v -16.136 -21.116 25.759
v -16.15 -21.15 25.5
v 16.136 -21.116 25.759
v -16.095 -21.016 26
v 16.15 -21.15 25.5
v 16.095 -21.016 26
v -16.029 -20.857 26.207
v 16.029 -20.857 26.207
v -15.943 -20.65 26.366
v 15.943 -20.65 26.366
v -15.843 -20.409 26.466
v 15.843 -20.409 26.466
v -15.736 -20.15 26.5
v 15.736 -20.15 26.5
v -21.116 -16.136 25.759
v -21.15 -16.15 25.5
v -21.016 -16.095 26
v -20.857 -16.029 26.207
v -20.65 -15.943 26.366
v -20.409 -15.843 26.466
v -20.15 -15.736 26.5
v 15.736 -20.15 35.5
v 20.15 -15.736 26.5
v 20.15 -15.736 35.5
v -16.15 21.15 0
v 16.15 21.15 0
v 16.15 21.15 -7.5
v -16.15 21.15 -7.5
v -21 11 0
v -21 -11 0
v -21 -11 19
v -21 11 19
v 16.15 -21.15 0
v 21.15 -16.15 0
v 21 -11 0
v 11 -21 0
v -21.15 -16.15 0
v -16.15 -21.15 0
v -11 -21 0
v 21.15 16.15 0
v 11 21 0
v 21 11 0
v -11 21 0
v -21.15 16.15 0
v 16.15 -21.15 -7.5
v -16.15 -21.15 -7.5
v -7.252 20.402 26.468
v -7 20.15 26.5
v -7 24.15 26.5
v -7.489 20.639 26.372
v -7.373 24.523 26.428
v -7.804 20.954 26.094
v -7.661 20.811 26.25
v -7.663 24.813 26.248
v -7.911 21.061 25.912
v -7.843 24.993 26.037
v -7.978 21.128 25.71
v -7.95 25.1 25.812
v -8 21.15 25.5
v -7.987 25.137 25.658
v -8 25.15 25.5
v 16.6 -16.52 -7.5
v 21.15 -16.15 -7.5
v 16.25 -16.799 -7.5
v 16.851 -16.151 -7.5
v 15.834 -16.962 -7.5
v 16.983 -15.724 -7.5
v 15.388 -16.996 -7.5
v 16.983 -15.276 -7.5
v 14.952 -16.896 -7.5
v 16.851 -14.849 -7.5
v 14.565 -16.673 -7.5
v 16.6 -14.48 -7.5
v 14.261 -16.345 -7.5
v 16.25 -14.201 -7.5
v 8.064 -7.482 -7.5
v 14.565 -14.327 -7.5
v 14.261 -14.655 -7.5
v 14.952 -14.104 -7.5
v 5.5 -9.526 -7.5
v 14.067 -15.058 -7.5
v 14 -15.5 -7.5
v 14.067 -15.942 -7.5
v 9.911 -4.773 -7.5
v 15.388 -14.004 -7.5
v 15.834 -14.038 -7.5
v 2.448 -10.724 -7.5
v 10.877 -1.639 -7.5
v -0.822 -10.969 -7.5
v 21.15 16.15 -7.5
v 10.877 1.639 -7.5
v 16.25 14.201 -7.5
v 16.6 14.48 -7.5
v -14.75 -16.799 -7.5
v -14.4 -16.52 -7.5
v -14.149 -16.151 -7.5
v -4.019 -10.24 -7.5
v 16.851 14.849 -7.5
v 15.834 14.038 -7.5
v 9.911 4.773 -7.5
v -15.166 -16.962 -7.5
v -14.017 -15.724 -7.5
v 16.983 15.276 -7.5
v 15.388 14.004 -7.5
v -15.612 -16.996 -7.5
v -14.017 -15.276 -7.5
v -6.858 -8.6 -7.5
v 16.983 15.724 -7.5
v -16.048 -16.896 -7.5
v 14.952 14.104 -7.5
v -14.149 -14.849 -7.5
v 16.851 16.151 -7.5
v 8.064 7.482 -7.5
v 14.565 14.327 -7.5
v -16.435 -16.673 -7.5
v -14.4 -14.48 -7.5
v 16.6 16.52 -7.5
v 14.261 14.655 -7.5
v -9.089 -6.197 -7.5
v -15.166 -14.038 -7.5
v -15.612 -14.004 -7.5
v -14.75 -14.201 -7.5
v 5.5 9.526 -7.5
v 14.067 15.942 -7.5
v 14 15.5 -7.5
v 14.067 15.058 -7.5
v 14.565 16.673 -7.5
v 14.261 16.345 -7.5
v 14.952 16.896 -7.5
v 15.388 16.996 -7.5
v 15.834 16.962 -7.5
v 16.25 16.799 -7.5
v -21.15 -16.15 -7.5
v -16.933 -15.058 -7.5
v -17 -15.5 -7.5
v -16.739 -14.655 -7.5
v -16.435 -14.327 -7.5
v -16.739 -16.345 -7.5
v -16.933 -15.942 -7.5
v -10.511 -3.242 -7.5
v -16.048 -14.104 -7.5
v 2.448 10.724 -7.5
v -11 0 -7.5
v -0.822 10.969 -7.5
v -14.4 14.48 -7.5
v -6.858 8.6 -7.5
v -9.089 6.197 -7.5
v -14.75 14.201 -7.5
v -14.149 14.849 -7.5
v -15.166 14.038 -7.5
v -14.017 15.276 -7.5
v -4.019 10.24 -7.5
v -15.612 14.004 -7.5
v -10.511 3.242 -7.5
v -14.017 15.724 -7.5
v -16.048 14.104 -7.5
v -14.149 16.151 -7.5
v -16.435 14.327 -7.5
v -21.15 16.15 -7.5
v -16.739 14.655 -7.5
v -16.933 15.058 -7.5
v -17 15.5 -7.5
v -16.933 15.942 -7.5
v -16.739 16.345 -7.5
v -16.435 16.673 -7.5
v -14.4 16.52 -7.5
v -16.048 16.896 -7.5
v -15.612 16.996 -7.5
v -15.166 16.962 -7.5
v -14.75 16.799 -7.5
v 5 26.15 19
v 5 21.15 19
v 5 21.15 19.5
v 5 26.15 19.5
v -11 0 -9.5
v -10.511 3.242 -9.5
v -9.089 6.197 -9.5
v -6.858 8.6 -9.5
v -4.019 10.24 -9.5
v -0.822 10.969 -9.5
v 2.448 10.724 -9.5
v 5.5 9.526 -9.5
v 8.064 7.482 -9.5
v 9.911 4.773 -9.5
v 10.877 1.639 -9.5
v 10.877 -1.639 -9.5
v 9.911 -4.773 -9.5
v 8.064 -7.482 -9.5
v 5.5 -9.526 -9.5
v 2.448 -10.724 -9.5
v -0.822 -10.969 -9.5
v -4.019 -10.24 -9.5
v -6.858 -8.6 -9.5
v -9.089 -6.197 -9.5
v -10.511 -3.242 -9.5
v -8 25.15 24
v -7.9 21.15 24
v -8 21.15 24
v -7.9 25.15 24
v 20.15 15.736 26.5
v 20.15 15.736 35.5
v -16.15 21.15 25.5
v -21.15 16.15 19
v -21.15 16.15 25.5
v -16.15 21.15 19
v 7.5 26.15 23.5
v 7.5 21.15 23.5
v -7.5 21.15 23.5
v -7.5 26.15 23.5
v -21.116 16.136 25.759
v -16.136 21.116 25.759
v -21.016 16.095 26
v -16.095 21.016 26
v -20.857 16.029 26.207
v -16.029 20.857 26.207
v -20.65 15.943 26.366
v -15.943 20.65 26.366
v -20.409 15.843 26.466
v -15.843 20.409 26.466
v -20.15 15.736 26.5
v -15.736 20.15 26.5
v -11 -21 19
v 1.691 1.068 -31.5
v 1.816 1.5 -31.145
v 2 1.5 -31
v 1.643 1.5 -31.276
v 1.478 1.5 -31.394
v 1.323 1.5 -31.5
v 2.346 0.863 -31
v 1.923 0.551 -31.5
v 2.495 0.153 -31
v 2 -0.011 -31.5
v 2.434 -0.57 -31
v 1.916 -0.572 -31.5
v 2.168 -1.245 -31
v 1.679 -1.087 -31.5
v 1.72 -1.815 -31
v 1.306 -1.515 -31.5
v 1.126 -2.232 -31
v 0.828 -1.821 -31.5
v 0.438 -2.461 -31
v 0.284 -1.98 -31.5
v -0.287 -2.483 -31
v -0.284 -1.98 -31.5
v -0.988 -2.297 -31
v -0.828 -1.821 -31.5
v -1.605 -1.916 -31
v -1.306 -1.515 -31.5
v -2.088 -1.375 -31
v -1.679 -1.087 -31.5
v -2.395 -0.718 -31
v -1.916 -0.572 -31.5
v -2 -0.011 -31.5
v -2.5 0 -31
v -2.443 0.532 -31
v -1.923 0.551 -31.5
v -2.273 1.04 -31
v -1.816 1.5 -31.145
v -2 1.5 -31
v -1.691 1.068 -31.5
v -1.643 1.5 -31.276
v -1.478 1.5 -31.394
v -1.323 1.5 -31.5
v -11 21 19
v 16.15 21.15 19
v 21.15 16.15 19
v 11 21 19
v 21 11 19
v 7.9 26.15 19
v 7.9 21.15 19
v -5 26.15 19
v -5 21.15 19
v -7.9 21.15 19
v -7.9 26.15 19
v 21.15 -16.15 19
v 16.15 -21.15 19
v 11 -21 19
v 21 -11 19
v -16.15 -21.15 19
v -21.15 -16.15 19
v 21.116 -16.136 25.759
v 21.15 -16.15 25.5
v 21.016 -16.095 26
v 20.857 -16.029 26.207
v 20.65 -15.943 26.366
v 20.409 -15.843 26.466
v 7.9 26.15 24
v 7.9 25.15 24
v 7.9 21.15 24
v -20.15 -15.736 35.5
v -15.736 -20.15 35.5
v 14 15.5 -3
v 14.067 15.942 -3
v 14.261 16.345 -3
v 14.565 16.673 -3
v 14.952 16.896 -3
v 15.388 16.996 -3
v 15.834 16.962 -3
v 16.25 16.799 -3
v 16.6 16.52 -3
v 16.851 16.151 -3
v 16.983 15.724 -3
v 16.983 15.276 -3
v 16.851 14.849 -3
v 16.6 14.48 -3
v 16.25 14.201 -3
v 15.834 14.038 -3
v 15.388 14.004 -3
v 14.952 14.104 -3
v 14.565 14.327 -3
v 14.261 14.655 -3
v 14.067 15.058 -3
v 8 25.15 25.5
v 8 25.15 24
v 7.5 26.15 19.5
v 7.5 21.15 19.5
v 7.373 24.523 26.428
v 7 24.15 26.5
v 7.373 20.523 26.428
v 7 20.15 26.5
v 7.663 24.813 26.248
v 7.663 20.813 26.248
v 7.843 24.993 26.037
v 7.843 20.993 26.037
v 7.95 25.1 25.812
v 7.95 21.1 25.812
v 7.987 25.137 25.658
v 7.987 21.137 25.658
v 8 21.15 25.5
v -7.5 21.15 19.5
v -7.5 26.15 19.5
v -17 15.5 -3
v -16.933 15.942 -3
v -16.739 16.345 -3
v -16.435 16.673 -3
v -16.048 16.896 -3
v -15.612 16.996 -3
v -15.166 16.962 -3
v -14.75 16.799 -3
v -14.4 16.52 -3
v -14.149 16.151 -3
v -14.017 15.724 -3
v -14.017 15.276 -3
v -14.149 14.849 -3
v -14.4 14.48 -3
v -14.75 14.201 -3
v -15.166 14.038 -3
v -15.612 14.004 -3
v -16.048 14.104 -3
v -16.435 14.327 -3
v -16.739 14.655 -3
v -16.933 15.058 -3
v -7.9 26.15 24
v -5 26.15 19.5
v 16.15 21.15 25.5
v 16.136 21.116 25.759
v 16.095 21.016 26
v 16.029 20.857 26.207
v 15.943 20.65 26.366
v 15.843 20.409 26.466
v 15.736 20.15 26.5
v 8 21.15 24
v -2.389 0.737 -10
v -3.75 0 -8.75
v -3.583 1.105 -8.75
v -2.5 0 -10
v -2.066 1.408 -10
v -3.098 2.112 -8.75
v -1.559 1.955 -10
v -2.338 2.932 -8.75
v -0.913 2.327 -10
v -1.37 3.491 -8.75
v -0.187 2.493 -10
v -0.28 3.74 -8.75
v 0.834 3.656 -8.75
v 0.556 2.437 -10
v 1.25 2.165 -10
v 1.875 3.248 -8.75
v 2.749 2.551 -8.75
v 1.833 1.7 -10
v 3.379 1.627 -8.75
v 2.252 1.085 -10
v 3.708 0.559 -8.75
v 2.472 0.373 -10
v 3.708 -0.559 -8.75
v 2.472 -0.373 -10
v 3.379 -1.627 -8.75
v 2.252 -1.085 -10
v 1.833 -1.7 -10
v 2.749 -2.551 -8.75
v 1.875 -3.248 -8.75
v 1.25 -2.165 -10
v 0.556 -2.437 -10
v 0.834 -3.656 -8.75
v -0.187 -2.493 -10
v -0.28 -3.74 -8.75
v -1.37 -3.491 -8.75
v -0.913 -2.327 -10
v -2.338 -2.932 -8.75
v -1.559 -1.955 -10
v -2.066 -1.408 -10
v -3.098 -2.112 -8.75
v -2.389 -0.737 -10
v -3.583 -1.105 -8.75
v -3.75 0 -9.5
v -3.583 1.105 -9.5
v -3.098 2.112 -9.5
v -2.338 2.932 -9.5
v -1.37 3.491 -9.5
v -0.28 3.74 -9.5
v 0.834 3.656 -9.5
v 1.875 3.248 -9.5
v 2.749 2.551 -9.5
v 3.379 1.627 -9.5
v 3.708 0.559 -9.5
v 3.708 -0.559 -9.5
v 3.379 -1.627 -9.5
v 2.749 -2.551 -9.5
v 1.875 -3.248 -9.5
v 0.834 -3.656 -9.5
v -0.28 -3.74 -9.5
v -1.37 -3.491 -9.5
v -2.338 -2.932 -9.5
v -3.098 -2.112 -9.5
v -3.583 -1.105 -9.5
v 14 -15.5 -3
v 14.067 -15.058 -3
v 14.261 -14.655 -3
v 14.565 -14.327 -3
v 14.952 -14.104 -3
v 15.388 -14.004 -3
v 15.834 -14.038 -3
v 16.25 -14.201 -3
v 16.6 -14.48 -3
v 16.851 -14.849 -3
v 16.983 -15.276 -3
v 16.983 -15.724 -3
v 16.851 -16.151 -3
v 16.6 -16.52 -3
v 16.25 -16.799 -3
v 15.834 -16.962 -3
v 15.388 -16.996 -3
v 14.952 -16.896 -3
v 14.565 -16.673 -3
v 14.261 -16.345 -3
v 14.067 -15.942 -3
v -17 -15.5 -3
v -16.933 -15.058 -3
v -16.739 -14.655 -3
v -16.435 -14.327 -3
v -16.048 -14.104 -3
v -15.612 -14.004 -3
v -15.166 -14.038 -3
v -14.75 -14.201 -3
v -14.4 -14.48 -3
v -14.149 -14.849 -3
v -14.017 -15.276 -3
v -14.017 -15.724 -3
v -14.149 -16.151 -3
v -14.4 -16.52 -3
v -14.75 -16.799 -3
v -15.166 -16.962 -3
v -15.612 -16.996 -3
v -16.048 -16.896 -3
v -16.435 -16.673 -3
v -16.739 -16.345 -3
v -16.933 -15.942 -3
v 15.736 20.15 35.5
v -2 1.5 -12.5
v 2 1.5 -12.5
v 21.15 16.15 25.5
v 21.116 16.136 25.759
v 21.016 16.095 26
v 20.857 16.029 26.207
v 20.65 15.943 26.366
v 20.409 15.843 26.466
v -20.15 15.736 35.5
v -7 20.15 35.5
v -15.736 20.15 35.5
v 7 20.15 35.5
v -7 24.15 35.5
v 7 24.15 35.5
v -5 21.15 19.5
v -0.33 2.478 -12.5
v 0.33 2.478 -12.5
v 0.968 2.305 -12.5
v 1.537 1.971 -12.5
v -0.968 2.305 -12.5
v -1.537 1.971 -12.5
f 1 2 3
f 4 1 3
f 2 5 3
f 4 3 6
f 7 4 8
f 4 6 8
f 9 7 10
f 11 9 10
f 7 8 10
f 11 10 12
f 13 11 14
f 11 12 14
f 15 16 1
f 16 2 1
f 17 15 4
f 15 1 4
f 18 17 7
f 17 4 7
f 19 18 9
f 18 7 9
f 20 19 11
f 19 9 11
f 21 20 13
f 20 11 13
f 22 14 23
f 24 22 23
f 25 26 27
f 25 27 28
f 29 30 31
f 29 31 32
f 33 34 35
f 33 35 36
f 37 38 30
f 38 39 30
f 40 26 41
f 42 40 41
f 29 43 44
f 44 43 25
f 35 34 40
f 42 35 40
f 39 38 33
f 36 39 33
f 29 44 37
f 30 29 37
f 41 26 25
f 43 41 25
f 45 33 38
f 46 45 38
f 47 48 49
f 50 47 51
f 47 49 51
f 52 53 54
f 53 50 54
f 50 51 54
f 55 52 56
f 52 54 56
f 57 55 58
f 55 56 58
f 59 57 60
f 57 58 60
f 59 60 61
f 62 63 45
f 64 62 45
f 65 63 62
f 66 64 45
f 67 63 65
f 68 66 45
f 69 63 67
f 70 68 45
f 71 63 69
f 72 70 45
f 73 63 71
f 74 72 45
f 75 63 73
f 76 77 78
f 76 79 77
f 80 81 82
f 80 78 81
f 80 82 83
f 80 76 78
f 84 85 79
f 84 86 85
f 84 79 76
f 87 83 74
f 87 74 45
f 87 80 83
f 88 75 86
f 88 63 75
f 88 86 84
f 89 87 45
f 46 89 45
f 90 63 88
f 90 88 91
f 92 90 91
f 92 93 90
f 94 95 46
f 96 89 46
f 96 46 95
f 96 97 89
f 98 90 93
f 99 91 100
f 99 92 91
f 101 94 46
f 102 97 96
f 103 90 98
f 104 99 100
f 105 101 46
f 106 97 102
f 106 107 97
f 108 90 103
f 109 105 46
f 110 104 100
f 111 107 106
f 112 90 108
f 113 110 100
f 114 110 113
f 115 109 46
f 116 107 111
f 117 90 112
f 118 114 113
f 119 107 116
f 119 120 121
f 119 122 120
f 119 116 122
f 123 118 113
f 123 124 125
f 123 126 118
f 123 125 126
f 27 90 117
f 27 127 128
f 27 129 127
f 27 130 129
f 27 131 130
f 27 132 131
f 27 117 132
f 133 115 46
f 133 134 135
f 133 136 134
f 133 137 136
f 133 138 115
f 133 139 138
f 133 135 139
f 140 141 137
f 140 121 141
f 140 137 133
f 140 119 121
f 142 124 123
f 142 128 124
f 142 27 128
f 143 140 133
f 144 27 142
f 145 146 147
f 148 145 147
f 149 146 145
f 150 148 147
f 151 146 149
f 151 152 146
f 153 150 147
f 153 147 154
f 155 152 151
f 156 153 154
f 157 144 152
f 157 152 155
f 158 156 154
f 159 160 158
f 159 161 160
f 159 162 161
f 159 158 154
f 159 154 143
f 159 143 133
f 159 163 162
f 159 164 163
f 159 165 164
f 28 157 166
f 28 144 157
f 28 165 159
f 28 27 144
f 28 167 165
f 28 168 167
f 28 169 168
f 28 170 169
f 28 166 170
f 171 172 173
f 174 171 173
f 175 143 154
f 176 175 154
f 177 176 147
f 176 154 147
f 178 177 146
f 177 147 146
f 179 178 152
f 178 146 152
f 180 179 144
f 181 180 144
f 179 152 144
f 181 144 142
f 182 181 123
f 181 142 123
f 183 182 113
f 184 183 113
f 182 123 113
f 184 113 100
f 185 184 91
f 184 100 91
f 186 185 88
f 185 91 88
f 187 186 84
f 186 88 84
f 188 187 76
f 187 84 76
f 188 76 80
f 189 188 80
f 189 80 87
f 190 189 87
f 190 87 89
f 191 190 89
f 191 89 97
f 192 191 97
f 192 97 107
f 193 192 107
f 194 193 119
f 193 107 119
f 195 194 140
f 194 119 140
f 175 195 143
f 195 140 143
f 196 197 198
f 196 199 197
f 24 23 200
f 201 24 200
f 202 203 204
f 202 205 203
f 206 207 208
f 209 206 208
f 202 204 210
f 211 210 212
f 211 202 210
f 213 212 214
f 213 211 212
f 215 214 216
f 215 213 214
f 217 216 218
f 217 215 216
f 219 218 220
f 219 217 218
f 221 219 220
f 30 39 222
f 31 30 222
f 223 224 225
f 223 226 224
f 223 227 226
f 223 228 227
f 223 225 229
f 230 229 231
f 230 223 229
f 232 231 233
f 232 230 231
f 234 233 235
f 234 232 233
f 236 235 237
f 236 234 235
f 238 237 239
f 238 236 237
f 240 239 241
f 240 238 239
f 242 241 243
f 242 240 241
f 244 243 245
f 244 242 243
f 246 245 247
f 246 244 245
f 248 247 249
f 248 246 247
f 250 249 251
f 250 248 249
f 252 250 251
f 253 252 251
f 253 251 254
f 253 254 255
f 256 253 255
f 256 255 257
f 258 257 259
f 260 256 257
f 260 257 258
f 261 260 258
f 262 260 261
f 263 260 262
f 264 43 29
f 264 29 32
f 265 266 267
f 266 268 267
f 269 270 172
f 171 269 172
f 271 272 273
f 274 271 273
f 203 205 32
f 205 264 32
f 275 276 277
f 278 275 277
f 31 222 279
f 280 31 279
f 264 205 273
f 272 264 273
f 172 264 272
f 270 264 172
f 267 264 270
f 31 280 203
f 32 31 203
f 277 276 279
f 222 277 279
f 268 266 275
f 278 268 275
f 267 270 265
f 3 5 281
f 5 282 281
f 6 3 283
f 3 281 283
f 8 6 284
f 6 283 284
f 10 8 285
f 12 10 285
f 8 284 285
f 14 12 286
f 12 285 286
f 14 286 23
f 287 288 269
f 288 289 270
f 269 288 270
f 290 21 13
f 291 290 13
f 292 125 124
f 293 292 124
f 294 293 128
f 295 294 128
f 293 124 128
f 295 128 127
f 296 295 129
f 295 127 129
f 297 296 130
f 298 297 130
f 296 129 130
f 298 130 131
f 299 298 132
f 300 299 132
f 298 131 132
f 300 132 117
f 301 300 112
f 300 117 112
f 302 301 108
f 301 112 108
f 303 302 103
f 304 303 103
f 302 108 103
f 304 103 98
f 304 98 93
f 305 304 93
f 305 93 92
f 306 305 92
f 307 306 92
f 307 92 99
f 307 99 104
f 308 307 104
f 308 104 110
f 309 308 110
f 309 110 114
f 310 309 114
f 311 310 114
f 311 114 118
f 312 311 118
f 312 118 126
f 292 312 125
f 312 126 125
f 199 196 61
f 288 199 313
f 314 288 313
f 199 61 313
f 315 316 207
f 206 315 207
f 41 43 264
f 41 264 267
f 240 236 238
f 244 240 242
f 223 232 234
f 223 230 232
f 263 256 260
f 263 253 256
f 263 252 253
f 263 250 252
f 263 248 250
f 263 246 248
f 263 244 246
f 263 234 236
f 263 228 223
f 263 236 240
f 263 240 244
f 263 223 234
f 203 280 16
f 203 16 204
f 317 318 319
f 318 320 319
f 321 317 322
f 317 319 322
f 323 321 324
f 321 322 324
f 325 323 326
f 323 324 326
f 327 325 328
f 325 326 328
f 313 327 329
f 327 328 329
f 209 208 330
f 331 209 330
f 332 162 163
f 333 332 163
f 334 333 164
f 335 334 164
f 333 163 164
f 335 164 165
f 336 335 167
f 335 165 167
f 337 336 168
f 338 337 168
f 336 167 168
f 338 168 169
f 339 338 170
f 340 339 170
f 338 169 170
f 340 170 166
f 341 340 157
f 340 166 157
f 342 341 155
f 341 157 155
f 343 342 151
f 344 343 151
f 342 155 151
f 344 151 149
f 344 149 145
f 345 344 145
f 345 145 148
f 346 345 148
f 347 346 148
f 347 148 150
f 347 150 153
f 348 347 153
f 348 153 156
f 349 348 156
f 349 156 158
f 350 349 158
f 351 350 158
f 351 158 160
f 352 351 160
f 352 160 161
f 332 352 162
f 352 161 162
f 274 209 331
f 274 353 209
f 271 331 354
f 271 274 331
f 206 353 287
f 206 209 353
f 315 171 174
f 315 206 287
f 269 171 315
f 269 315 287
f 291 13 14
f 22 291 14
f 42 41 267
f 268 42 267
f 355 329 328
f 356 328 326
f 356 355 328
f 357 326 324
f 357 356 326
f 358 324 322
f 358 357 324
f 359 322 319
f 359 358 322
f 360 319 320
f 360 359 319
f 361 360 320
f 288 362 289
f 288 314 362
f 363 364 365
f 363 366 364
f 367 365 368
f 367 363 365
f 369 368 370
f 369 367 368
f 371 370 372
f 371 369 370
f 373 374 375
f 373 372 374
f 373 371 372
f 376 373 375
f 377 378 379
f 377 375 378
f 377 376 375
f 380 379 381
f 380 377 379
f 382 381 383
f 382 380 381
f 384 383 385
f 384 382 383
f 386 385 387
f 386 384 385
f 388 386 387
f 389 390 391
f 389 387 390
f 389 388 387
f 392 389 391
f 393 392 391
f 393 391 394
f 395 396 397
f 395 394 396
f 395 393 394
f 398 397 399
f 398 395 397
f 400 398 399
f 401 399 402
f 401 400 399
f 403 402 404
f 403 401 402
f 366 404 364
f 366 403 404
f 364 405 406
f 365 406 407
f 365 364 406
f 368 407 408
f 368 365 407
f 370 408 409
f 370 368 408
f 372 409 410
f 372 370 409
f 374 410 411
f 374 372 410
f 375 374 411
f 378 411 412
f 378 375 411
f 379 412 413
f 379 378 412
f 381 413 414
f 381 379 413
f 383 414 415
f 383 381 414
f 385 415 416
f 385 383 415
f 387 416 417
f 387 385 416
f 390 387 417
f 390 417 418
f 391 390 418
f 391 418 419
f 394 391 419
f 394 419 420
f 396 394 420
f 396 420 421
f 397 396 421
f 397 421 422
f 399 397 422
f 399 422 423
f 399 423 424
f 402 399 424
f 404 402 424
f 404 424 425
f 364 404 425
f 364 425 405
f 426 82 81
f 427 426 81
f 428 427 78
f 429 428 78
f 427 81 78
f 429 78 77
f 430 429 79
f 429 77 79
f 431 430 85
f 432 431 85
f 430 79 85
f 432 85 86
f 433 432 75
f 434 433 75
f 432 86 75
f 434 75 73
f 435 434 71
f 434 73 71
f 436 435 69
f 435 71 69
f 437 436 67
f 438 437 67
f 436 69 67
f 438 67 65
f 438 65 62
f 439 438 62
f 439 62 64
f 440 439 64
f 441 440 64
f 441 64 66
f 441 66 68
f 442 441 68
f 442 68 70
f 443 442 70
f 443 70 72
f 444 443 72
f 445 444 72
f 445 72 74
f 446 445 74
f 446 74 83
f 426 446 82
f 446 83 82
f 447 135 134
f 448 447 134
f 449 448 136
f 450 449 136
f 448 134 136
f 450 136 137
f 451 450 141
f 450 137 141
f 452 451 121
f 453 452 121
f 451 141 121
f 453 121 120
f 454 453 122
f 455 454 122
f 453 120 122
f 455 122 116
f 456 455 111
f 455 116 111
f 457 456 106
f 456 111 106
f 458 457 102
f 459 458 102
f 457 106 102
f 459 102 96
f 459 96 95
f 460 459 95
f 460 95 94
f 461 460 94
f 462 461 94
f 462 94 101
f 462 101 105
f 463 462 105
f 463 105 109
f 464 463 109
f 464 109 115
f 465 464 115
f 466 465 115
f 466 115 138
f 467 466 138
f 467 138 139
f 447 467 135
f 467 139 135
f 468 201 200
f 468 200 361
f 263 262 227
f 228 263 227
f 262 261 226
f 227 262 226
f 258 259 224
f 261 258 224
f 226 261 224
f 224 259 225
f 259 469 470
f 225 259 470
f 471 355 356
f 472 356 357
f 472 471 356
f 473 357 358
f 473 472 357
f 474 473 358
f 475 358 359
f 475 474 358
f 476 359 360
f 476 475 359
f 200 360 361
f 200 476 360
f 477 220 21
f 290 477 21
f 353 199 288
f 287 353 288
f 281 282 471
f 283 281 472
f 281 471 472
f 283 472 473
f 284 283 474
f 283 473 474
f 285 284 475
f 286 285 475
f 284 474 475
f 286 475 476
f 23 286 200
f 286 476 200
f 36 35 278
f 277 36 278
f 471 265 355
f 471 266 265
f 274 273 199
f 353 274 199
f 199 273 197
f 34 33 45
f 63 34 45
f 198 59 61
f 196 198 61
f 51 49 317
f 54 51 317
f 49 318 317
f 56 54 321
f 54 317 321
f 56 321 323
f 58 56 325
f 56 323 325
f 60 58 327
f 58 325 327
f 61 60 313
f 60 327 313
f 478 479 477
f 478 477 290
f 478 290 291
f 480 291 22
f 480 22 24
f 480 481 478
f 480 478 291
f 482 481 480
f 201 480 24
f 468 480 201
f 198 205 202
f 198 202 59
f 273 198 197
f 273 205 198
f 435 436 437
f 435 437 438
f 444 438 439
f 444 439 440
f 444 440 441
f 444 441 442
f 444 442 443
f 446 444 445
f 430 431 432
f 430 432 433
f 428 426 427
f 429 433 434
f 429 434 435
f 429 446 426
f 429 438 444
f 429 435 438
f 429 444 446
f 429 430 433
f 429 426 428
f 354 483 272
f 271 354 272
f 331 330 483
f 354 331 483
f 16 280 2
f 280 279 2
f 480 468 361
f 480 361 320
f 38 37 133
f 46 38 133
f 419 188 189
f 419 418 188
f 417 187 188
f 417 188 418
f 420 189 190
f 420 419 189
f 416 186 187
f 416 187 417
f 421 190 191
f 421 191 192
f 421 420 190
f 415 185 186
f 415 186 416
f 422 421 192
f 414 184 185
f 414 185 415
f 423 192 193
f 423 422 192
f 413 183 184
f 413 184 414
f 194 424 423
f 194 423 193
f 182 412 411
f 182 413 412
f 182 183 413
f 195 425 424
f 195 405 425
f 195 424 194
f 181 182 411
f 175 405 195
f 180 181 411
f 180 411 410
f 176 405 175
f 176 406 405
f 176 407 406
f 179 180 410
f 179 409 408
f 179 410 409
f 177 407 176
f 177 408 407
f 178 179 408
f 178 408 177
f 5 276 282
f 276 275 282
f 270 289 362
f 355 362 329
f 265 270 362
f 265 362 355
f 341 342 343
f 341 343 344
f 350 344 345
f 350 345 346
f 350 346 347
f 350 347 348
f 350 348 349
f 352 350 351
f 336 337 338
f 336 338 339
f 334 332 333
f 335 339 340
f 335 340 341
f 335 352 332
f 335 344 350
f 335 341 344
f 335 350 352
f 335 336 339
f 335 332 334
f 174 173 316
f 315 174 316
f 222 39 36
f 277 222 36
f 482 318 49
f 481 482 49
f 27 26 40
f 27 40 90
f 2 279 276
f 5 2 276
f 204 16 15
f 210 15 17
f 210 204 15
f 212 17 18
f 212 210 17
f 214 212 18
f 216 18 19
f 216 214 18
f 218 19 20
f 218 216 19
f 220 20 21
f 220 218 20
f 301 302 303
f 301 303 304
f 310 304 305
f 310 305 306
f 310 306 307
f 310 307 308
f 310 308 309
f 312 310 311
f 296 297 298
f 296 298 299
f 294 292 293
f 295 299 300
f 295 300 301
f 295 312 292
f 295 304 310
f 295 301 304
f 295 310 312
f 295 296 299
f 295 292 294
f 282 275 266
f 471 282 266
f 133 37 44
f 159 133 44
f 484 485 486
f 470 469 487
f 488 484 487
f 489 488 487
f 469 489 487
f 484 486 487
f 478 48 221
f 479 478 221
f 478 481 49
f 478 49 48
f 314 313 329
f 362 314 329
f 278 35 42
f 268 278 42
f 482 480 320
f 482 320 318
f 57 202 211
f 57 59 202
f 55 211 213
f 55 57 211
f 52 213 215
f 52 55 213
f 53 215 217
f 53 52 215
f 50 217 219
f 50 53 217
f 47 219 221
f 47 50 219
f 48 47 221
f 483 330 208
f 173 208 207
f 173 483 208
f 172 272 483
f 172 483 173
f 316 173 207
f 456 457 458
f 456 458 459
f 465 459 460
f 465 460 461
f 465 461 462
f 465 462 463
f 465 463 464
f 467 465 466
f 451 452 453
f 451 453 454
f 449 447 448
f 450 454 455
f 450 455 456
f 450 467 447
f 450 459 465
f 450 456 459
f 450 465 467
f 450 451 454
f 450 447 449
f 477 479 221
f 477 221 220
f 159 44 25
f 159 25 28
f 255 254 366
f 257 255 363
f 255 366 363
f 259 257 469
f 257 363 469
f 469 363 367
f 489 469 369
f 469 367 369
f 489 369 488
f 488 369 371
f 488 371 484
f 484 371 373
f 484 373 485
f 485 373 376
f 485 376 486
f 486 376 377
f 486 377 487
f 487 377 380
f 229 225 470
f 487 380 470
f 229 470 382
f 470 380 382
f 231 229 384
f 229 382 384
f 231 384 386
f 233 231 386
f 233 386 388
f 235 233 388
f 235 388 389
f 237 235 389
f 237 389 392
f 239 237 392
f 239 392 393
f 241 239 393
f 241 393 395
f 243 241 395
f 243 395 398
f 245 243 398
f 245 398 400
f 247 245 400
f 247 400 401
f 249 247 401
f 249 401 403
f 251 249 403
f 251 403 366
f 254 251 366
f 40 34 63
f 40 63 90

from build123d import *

# Parameters (mm, degrees)
SKETCH_1_W          = 42
SKETCH_1_H          = 42
EXTRUDE_1_DEPTH     = 19
CHAMFER_1_SIZE      = 10
SKETCH_2_W          = 42.3
SKETCH_2_H          = 42.3
EXTRUDE_2_DEPTH     = 7.5
SKETCH_3_W          = 42.3
SKETCH_3_H          = 42.3
EXTRUDE_3_DEPTH     = 7.5
CHAMFER_2_SIZE      = 5
SKETCH_4_R          = 1.5
CUT_EXTRUDE_1_DEPTH = 4.5
SKETCH_5_R          = 11
SKETCH_5_R_2        = 3.75
EXTRUDE_4_DEPTH     = 2
SKETCH_6_R          = 2.5
EXTRUDE_5_DEPTH     = 24
CUT_EXTRUDE_START   = -19
CUT_EXTRUDE_2_DEPTH = 19
CHAMFER_3_SIZE      = 0.5
EXTRUDE_6_DEPTH     = 2.5
FILLET_1_R          = 1
EXTRUDE_7_DEPTH     = 5
EXTRUDE_8_DEPTH     = 9
CHAMFER_4_SIZE      = 2.5


with BuildPart() as part:
    # 草图1 → 凸台-拉伸1 (new body)
    with BuildSketch(Plane.XY):
        Rectangle(SKETCH_1_W, SKETCH_1_H)
    extrude(amount=EXTRUDE_1_DEPTH)

    # 倒角1
    chamfer_1_edges = [part.edges().sort_by_distance(p)[0] for p in [
        (21, -21, 9.5),
        (-21, -21, 9.5),
        (-21, 21, 9.5),
        (21, 21, 9.5),
    ]]
    chamfer(chamfer_1_edges, length=CHAMFER_1_SIZE)

    # 草图2 → 凸台-拉伸2 (add)
    with BuildSketch(Plane.XY.offset(19)):
        Rectangle(SKETCH_2_W, SKETCH_2_H)
    extrude(amount=EXTRUDE_2_DEPTH)

    # 草图3 → 凸台-拉伸3 (add)
    with BuildSketch(Plane(origin=(0, 0, 0), x_dir=(-1, 0, 0), z_dir=(0, 0, -1))):
        Rectangle(SKETCH_3_W, SKETCH_3_H)
    extrude(amount=EXTRUDE_3_DEPTH)

    # 倒角2
    chamfer_2_edges = [part.edges().sort_by_distance(p)[0] for p in [
        (21.15, -21.15, 22.75),
        (21.15, 21.15, 22.75),
        (-21.15, 21.15, 22.75),
        (-21.15, -21.15, 22.75),
        (-21.15, -21.15, -3.75),
        (-21.15, 21.15, -3.75),
        (21.15, 21.15, -3.75),
        (21.15, -21.15, -3.75),
    ]]
    chamfer(chamfer_2_edges, length=CHAMFER_2_SIZE)

    # 草图4 → 切除-拉伸1 (cut)
    with BuildSketch(Plane(origin=(0, 0, -7.5), x_dir=(-1, 0, 0), z_dir=(0, 0, -1))):
        with Locations((-15.5, 15.5)):
            Circle(SKETCH_4_R)
        with Locations((15.5, 15.5)):
            Circle(SKETCH_4_R)
        with Locations((15.5, -15.5)):
            Circle(SKETCH_4_R)
        with Locations((-15.5, -15.5)):
            Circle(SKETCH_4_R)
    extrude(amount=-CUT_EXTRUDE_1_DEPTH, mode=Mode.SUBTRACT)

    # 草图5 → 凸台-拉伸4 (add)
    with BuildSketch(Plane(origin=(0, 0, -7.5), x_dir=(-1, 0, 0), z_dir=(0, 0, -1))):
        Circle(SKETCH_5_R)
        Circle(SKETCH_5_R_2, mode=Mode.SUBTRACT)
    extrude(amount=EXTRUDE_4_DEPTH)

    # 草图6 → 凸台-拉伸5 (add)
    with BuildSketch(Plane(origin=(0, 0, -7.5), x_dir=(-1, 0, 0), z_dir=(0, 0, -1))):
        Circle(SKETCH_6_R)
    extrude(amount=EXTRUDE_5_DEPTH)

    # 草图7 → 切除-拉伸2 (cut)
    with BuildSketch(Plane(origin=(0, 0, -31.5), x_dir=(-1, 0, 0), z_dir=(0, 0, -1)).offset(CUT_EXTRUDE_START)):
        with BuildLine():
            Line((2, 1.5), (-2, 1.5))
            ThreePointArc((-2, 1.5), (0, 2.5), (2, 1.5))
        make_face()
    extrude(amount=CUT_EXTRUDE_2_DEPTH, mode=Mode.SUBTRACT)

    # 倒角3
    chamfer_3_edges = [part.edges().sort_by_distance(p)[0] for p in [
        (0.790569415, -2.371708245, -31.5),
    ]]
    chamfer(chamfer_3_edges, length=CHAMFER_3_SIZE)

    # 草图8 → 凸台-拉伸6 (add)
    with BuildSketch(Plane.XY.offset(26.5)):
        Polygon((0, 21.15), (-8, 21.15), (-8, 25.15), (8, 25.15), (8, 21.15), align=None)
    extrude(amount=-EXTRUDE_6_DEPTH)

    # 圆角1
    fillet_1_edges = [part.edges().sort_by_distance(p)[0] for p in [
        (-12.075, 21.15, 26.5),
        (8, 23.15, 26.5),
        (0, 25.15, 26.5),
        (-8, 23.15, 26.5),
        (0, -21.15, 26.5),
        (-21.15, 0, 26.5),
        (21.15, 0, 26.5),
        (12.075, 21.15, 26.5),
        (-18.65, 18.65, 26.5),
        (18.65, 18.65, 26.5),
        (18.65, -18.65, 26.5),
        (-18.65, -18.65, 26.5),
    ]]
    fillet(fillet_1_edges, radius=FILLET_1_R)

    # 草图9 → 凸台-拉伸7 (add)
    with BuildSketch(Plane(origin=(0, 21.15, 0), x_dir=(1, 0, 0), z_dir=(0, 1, 0))):
        Polygon((7.9, -19), (5, -19), (5, -19.5), (7.5, -19.5), (7.5, -23.5), (-7.5, -23.5), (-7.5, -19.5), (-5, -19.5), (-5, -19), (-7.9, -19), (-7.9, -24), (7.9, -24), align=None)
    extrude(amount=EXTRUDE_7_DEPTH)

    # 草图10 → 凸台-拉伸8 (add)
    with BuildSketch(Plane.XY.offset(26.5)):
        Polygon((-7, 20.15), (-15.735786438, 20.15), (-20.15, 15.735786438), (-20.15, -15.735786438), (-15.735786438, -20.15), (15.735786438, -20.15), (20.15, -15.735786438), (20.15, 15.735786438), (15.735786438, 20.15), (7, 20.15), (7, 24.15), (-7, 24.15), align=None)
    extrude(amount=EXTRUDE_8_DEPTH)

    # 倒角4
    # the kernel refuses this chamfer: 2.5 mm, written as the material it adds along each edge
    with BuildSketch(Plane(origin=(0, 0, -7.5), x_dir=(-1, 0, 0), z_dir=(0, -1, 0))) as chamfer_4_piece_1:
        Polygon((2.5 + CHAMFER_4_SIZE, 0), (2.5, CHAMFER_4_SIZE), (2.5, 0), align=None)
    revolve(axis=Axis((0, 0, -7.5), (0, 0, -1)))


solid = part.part
